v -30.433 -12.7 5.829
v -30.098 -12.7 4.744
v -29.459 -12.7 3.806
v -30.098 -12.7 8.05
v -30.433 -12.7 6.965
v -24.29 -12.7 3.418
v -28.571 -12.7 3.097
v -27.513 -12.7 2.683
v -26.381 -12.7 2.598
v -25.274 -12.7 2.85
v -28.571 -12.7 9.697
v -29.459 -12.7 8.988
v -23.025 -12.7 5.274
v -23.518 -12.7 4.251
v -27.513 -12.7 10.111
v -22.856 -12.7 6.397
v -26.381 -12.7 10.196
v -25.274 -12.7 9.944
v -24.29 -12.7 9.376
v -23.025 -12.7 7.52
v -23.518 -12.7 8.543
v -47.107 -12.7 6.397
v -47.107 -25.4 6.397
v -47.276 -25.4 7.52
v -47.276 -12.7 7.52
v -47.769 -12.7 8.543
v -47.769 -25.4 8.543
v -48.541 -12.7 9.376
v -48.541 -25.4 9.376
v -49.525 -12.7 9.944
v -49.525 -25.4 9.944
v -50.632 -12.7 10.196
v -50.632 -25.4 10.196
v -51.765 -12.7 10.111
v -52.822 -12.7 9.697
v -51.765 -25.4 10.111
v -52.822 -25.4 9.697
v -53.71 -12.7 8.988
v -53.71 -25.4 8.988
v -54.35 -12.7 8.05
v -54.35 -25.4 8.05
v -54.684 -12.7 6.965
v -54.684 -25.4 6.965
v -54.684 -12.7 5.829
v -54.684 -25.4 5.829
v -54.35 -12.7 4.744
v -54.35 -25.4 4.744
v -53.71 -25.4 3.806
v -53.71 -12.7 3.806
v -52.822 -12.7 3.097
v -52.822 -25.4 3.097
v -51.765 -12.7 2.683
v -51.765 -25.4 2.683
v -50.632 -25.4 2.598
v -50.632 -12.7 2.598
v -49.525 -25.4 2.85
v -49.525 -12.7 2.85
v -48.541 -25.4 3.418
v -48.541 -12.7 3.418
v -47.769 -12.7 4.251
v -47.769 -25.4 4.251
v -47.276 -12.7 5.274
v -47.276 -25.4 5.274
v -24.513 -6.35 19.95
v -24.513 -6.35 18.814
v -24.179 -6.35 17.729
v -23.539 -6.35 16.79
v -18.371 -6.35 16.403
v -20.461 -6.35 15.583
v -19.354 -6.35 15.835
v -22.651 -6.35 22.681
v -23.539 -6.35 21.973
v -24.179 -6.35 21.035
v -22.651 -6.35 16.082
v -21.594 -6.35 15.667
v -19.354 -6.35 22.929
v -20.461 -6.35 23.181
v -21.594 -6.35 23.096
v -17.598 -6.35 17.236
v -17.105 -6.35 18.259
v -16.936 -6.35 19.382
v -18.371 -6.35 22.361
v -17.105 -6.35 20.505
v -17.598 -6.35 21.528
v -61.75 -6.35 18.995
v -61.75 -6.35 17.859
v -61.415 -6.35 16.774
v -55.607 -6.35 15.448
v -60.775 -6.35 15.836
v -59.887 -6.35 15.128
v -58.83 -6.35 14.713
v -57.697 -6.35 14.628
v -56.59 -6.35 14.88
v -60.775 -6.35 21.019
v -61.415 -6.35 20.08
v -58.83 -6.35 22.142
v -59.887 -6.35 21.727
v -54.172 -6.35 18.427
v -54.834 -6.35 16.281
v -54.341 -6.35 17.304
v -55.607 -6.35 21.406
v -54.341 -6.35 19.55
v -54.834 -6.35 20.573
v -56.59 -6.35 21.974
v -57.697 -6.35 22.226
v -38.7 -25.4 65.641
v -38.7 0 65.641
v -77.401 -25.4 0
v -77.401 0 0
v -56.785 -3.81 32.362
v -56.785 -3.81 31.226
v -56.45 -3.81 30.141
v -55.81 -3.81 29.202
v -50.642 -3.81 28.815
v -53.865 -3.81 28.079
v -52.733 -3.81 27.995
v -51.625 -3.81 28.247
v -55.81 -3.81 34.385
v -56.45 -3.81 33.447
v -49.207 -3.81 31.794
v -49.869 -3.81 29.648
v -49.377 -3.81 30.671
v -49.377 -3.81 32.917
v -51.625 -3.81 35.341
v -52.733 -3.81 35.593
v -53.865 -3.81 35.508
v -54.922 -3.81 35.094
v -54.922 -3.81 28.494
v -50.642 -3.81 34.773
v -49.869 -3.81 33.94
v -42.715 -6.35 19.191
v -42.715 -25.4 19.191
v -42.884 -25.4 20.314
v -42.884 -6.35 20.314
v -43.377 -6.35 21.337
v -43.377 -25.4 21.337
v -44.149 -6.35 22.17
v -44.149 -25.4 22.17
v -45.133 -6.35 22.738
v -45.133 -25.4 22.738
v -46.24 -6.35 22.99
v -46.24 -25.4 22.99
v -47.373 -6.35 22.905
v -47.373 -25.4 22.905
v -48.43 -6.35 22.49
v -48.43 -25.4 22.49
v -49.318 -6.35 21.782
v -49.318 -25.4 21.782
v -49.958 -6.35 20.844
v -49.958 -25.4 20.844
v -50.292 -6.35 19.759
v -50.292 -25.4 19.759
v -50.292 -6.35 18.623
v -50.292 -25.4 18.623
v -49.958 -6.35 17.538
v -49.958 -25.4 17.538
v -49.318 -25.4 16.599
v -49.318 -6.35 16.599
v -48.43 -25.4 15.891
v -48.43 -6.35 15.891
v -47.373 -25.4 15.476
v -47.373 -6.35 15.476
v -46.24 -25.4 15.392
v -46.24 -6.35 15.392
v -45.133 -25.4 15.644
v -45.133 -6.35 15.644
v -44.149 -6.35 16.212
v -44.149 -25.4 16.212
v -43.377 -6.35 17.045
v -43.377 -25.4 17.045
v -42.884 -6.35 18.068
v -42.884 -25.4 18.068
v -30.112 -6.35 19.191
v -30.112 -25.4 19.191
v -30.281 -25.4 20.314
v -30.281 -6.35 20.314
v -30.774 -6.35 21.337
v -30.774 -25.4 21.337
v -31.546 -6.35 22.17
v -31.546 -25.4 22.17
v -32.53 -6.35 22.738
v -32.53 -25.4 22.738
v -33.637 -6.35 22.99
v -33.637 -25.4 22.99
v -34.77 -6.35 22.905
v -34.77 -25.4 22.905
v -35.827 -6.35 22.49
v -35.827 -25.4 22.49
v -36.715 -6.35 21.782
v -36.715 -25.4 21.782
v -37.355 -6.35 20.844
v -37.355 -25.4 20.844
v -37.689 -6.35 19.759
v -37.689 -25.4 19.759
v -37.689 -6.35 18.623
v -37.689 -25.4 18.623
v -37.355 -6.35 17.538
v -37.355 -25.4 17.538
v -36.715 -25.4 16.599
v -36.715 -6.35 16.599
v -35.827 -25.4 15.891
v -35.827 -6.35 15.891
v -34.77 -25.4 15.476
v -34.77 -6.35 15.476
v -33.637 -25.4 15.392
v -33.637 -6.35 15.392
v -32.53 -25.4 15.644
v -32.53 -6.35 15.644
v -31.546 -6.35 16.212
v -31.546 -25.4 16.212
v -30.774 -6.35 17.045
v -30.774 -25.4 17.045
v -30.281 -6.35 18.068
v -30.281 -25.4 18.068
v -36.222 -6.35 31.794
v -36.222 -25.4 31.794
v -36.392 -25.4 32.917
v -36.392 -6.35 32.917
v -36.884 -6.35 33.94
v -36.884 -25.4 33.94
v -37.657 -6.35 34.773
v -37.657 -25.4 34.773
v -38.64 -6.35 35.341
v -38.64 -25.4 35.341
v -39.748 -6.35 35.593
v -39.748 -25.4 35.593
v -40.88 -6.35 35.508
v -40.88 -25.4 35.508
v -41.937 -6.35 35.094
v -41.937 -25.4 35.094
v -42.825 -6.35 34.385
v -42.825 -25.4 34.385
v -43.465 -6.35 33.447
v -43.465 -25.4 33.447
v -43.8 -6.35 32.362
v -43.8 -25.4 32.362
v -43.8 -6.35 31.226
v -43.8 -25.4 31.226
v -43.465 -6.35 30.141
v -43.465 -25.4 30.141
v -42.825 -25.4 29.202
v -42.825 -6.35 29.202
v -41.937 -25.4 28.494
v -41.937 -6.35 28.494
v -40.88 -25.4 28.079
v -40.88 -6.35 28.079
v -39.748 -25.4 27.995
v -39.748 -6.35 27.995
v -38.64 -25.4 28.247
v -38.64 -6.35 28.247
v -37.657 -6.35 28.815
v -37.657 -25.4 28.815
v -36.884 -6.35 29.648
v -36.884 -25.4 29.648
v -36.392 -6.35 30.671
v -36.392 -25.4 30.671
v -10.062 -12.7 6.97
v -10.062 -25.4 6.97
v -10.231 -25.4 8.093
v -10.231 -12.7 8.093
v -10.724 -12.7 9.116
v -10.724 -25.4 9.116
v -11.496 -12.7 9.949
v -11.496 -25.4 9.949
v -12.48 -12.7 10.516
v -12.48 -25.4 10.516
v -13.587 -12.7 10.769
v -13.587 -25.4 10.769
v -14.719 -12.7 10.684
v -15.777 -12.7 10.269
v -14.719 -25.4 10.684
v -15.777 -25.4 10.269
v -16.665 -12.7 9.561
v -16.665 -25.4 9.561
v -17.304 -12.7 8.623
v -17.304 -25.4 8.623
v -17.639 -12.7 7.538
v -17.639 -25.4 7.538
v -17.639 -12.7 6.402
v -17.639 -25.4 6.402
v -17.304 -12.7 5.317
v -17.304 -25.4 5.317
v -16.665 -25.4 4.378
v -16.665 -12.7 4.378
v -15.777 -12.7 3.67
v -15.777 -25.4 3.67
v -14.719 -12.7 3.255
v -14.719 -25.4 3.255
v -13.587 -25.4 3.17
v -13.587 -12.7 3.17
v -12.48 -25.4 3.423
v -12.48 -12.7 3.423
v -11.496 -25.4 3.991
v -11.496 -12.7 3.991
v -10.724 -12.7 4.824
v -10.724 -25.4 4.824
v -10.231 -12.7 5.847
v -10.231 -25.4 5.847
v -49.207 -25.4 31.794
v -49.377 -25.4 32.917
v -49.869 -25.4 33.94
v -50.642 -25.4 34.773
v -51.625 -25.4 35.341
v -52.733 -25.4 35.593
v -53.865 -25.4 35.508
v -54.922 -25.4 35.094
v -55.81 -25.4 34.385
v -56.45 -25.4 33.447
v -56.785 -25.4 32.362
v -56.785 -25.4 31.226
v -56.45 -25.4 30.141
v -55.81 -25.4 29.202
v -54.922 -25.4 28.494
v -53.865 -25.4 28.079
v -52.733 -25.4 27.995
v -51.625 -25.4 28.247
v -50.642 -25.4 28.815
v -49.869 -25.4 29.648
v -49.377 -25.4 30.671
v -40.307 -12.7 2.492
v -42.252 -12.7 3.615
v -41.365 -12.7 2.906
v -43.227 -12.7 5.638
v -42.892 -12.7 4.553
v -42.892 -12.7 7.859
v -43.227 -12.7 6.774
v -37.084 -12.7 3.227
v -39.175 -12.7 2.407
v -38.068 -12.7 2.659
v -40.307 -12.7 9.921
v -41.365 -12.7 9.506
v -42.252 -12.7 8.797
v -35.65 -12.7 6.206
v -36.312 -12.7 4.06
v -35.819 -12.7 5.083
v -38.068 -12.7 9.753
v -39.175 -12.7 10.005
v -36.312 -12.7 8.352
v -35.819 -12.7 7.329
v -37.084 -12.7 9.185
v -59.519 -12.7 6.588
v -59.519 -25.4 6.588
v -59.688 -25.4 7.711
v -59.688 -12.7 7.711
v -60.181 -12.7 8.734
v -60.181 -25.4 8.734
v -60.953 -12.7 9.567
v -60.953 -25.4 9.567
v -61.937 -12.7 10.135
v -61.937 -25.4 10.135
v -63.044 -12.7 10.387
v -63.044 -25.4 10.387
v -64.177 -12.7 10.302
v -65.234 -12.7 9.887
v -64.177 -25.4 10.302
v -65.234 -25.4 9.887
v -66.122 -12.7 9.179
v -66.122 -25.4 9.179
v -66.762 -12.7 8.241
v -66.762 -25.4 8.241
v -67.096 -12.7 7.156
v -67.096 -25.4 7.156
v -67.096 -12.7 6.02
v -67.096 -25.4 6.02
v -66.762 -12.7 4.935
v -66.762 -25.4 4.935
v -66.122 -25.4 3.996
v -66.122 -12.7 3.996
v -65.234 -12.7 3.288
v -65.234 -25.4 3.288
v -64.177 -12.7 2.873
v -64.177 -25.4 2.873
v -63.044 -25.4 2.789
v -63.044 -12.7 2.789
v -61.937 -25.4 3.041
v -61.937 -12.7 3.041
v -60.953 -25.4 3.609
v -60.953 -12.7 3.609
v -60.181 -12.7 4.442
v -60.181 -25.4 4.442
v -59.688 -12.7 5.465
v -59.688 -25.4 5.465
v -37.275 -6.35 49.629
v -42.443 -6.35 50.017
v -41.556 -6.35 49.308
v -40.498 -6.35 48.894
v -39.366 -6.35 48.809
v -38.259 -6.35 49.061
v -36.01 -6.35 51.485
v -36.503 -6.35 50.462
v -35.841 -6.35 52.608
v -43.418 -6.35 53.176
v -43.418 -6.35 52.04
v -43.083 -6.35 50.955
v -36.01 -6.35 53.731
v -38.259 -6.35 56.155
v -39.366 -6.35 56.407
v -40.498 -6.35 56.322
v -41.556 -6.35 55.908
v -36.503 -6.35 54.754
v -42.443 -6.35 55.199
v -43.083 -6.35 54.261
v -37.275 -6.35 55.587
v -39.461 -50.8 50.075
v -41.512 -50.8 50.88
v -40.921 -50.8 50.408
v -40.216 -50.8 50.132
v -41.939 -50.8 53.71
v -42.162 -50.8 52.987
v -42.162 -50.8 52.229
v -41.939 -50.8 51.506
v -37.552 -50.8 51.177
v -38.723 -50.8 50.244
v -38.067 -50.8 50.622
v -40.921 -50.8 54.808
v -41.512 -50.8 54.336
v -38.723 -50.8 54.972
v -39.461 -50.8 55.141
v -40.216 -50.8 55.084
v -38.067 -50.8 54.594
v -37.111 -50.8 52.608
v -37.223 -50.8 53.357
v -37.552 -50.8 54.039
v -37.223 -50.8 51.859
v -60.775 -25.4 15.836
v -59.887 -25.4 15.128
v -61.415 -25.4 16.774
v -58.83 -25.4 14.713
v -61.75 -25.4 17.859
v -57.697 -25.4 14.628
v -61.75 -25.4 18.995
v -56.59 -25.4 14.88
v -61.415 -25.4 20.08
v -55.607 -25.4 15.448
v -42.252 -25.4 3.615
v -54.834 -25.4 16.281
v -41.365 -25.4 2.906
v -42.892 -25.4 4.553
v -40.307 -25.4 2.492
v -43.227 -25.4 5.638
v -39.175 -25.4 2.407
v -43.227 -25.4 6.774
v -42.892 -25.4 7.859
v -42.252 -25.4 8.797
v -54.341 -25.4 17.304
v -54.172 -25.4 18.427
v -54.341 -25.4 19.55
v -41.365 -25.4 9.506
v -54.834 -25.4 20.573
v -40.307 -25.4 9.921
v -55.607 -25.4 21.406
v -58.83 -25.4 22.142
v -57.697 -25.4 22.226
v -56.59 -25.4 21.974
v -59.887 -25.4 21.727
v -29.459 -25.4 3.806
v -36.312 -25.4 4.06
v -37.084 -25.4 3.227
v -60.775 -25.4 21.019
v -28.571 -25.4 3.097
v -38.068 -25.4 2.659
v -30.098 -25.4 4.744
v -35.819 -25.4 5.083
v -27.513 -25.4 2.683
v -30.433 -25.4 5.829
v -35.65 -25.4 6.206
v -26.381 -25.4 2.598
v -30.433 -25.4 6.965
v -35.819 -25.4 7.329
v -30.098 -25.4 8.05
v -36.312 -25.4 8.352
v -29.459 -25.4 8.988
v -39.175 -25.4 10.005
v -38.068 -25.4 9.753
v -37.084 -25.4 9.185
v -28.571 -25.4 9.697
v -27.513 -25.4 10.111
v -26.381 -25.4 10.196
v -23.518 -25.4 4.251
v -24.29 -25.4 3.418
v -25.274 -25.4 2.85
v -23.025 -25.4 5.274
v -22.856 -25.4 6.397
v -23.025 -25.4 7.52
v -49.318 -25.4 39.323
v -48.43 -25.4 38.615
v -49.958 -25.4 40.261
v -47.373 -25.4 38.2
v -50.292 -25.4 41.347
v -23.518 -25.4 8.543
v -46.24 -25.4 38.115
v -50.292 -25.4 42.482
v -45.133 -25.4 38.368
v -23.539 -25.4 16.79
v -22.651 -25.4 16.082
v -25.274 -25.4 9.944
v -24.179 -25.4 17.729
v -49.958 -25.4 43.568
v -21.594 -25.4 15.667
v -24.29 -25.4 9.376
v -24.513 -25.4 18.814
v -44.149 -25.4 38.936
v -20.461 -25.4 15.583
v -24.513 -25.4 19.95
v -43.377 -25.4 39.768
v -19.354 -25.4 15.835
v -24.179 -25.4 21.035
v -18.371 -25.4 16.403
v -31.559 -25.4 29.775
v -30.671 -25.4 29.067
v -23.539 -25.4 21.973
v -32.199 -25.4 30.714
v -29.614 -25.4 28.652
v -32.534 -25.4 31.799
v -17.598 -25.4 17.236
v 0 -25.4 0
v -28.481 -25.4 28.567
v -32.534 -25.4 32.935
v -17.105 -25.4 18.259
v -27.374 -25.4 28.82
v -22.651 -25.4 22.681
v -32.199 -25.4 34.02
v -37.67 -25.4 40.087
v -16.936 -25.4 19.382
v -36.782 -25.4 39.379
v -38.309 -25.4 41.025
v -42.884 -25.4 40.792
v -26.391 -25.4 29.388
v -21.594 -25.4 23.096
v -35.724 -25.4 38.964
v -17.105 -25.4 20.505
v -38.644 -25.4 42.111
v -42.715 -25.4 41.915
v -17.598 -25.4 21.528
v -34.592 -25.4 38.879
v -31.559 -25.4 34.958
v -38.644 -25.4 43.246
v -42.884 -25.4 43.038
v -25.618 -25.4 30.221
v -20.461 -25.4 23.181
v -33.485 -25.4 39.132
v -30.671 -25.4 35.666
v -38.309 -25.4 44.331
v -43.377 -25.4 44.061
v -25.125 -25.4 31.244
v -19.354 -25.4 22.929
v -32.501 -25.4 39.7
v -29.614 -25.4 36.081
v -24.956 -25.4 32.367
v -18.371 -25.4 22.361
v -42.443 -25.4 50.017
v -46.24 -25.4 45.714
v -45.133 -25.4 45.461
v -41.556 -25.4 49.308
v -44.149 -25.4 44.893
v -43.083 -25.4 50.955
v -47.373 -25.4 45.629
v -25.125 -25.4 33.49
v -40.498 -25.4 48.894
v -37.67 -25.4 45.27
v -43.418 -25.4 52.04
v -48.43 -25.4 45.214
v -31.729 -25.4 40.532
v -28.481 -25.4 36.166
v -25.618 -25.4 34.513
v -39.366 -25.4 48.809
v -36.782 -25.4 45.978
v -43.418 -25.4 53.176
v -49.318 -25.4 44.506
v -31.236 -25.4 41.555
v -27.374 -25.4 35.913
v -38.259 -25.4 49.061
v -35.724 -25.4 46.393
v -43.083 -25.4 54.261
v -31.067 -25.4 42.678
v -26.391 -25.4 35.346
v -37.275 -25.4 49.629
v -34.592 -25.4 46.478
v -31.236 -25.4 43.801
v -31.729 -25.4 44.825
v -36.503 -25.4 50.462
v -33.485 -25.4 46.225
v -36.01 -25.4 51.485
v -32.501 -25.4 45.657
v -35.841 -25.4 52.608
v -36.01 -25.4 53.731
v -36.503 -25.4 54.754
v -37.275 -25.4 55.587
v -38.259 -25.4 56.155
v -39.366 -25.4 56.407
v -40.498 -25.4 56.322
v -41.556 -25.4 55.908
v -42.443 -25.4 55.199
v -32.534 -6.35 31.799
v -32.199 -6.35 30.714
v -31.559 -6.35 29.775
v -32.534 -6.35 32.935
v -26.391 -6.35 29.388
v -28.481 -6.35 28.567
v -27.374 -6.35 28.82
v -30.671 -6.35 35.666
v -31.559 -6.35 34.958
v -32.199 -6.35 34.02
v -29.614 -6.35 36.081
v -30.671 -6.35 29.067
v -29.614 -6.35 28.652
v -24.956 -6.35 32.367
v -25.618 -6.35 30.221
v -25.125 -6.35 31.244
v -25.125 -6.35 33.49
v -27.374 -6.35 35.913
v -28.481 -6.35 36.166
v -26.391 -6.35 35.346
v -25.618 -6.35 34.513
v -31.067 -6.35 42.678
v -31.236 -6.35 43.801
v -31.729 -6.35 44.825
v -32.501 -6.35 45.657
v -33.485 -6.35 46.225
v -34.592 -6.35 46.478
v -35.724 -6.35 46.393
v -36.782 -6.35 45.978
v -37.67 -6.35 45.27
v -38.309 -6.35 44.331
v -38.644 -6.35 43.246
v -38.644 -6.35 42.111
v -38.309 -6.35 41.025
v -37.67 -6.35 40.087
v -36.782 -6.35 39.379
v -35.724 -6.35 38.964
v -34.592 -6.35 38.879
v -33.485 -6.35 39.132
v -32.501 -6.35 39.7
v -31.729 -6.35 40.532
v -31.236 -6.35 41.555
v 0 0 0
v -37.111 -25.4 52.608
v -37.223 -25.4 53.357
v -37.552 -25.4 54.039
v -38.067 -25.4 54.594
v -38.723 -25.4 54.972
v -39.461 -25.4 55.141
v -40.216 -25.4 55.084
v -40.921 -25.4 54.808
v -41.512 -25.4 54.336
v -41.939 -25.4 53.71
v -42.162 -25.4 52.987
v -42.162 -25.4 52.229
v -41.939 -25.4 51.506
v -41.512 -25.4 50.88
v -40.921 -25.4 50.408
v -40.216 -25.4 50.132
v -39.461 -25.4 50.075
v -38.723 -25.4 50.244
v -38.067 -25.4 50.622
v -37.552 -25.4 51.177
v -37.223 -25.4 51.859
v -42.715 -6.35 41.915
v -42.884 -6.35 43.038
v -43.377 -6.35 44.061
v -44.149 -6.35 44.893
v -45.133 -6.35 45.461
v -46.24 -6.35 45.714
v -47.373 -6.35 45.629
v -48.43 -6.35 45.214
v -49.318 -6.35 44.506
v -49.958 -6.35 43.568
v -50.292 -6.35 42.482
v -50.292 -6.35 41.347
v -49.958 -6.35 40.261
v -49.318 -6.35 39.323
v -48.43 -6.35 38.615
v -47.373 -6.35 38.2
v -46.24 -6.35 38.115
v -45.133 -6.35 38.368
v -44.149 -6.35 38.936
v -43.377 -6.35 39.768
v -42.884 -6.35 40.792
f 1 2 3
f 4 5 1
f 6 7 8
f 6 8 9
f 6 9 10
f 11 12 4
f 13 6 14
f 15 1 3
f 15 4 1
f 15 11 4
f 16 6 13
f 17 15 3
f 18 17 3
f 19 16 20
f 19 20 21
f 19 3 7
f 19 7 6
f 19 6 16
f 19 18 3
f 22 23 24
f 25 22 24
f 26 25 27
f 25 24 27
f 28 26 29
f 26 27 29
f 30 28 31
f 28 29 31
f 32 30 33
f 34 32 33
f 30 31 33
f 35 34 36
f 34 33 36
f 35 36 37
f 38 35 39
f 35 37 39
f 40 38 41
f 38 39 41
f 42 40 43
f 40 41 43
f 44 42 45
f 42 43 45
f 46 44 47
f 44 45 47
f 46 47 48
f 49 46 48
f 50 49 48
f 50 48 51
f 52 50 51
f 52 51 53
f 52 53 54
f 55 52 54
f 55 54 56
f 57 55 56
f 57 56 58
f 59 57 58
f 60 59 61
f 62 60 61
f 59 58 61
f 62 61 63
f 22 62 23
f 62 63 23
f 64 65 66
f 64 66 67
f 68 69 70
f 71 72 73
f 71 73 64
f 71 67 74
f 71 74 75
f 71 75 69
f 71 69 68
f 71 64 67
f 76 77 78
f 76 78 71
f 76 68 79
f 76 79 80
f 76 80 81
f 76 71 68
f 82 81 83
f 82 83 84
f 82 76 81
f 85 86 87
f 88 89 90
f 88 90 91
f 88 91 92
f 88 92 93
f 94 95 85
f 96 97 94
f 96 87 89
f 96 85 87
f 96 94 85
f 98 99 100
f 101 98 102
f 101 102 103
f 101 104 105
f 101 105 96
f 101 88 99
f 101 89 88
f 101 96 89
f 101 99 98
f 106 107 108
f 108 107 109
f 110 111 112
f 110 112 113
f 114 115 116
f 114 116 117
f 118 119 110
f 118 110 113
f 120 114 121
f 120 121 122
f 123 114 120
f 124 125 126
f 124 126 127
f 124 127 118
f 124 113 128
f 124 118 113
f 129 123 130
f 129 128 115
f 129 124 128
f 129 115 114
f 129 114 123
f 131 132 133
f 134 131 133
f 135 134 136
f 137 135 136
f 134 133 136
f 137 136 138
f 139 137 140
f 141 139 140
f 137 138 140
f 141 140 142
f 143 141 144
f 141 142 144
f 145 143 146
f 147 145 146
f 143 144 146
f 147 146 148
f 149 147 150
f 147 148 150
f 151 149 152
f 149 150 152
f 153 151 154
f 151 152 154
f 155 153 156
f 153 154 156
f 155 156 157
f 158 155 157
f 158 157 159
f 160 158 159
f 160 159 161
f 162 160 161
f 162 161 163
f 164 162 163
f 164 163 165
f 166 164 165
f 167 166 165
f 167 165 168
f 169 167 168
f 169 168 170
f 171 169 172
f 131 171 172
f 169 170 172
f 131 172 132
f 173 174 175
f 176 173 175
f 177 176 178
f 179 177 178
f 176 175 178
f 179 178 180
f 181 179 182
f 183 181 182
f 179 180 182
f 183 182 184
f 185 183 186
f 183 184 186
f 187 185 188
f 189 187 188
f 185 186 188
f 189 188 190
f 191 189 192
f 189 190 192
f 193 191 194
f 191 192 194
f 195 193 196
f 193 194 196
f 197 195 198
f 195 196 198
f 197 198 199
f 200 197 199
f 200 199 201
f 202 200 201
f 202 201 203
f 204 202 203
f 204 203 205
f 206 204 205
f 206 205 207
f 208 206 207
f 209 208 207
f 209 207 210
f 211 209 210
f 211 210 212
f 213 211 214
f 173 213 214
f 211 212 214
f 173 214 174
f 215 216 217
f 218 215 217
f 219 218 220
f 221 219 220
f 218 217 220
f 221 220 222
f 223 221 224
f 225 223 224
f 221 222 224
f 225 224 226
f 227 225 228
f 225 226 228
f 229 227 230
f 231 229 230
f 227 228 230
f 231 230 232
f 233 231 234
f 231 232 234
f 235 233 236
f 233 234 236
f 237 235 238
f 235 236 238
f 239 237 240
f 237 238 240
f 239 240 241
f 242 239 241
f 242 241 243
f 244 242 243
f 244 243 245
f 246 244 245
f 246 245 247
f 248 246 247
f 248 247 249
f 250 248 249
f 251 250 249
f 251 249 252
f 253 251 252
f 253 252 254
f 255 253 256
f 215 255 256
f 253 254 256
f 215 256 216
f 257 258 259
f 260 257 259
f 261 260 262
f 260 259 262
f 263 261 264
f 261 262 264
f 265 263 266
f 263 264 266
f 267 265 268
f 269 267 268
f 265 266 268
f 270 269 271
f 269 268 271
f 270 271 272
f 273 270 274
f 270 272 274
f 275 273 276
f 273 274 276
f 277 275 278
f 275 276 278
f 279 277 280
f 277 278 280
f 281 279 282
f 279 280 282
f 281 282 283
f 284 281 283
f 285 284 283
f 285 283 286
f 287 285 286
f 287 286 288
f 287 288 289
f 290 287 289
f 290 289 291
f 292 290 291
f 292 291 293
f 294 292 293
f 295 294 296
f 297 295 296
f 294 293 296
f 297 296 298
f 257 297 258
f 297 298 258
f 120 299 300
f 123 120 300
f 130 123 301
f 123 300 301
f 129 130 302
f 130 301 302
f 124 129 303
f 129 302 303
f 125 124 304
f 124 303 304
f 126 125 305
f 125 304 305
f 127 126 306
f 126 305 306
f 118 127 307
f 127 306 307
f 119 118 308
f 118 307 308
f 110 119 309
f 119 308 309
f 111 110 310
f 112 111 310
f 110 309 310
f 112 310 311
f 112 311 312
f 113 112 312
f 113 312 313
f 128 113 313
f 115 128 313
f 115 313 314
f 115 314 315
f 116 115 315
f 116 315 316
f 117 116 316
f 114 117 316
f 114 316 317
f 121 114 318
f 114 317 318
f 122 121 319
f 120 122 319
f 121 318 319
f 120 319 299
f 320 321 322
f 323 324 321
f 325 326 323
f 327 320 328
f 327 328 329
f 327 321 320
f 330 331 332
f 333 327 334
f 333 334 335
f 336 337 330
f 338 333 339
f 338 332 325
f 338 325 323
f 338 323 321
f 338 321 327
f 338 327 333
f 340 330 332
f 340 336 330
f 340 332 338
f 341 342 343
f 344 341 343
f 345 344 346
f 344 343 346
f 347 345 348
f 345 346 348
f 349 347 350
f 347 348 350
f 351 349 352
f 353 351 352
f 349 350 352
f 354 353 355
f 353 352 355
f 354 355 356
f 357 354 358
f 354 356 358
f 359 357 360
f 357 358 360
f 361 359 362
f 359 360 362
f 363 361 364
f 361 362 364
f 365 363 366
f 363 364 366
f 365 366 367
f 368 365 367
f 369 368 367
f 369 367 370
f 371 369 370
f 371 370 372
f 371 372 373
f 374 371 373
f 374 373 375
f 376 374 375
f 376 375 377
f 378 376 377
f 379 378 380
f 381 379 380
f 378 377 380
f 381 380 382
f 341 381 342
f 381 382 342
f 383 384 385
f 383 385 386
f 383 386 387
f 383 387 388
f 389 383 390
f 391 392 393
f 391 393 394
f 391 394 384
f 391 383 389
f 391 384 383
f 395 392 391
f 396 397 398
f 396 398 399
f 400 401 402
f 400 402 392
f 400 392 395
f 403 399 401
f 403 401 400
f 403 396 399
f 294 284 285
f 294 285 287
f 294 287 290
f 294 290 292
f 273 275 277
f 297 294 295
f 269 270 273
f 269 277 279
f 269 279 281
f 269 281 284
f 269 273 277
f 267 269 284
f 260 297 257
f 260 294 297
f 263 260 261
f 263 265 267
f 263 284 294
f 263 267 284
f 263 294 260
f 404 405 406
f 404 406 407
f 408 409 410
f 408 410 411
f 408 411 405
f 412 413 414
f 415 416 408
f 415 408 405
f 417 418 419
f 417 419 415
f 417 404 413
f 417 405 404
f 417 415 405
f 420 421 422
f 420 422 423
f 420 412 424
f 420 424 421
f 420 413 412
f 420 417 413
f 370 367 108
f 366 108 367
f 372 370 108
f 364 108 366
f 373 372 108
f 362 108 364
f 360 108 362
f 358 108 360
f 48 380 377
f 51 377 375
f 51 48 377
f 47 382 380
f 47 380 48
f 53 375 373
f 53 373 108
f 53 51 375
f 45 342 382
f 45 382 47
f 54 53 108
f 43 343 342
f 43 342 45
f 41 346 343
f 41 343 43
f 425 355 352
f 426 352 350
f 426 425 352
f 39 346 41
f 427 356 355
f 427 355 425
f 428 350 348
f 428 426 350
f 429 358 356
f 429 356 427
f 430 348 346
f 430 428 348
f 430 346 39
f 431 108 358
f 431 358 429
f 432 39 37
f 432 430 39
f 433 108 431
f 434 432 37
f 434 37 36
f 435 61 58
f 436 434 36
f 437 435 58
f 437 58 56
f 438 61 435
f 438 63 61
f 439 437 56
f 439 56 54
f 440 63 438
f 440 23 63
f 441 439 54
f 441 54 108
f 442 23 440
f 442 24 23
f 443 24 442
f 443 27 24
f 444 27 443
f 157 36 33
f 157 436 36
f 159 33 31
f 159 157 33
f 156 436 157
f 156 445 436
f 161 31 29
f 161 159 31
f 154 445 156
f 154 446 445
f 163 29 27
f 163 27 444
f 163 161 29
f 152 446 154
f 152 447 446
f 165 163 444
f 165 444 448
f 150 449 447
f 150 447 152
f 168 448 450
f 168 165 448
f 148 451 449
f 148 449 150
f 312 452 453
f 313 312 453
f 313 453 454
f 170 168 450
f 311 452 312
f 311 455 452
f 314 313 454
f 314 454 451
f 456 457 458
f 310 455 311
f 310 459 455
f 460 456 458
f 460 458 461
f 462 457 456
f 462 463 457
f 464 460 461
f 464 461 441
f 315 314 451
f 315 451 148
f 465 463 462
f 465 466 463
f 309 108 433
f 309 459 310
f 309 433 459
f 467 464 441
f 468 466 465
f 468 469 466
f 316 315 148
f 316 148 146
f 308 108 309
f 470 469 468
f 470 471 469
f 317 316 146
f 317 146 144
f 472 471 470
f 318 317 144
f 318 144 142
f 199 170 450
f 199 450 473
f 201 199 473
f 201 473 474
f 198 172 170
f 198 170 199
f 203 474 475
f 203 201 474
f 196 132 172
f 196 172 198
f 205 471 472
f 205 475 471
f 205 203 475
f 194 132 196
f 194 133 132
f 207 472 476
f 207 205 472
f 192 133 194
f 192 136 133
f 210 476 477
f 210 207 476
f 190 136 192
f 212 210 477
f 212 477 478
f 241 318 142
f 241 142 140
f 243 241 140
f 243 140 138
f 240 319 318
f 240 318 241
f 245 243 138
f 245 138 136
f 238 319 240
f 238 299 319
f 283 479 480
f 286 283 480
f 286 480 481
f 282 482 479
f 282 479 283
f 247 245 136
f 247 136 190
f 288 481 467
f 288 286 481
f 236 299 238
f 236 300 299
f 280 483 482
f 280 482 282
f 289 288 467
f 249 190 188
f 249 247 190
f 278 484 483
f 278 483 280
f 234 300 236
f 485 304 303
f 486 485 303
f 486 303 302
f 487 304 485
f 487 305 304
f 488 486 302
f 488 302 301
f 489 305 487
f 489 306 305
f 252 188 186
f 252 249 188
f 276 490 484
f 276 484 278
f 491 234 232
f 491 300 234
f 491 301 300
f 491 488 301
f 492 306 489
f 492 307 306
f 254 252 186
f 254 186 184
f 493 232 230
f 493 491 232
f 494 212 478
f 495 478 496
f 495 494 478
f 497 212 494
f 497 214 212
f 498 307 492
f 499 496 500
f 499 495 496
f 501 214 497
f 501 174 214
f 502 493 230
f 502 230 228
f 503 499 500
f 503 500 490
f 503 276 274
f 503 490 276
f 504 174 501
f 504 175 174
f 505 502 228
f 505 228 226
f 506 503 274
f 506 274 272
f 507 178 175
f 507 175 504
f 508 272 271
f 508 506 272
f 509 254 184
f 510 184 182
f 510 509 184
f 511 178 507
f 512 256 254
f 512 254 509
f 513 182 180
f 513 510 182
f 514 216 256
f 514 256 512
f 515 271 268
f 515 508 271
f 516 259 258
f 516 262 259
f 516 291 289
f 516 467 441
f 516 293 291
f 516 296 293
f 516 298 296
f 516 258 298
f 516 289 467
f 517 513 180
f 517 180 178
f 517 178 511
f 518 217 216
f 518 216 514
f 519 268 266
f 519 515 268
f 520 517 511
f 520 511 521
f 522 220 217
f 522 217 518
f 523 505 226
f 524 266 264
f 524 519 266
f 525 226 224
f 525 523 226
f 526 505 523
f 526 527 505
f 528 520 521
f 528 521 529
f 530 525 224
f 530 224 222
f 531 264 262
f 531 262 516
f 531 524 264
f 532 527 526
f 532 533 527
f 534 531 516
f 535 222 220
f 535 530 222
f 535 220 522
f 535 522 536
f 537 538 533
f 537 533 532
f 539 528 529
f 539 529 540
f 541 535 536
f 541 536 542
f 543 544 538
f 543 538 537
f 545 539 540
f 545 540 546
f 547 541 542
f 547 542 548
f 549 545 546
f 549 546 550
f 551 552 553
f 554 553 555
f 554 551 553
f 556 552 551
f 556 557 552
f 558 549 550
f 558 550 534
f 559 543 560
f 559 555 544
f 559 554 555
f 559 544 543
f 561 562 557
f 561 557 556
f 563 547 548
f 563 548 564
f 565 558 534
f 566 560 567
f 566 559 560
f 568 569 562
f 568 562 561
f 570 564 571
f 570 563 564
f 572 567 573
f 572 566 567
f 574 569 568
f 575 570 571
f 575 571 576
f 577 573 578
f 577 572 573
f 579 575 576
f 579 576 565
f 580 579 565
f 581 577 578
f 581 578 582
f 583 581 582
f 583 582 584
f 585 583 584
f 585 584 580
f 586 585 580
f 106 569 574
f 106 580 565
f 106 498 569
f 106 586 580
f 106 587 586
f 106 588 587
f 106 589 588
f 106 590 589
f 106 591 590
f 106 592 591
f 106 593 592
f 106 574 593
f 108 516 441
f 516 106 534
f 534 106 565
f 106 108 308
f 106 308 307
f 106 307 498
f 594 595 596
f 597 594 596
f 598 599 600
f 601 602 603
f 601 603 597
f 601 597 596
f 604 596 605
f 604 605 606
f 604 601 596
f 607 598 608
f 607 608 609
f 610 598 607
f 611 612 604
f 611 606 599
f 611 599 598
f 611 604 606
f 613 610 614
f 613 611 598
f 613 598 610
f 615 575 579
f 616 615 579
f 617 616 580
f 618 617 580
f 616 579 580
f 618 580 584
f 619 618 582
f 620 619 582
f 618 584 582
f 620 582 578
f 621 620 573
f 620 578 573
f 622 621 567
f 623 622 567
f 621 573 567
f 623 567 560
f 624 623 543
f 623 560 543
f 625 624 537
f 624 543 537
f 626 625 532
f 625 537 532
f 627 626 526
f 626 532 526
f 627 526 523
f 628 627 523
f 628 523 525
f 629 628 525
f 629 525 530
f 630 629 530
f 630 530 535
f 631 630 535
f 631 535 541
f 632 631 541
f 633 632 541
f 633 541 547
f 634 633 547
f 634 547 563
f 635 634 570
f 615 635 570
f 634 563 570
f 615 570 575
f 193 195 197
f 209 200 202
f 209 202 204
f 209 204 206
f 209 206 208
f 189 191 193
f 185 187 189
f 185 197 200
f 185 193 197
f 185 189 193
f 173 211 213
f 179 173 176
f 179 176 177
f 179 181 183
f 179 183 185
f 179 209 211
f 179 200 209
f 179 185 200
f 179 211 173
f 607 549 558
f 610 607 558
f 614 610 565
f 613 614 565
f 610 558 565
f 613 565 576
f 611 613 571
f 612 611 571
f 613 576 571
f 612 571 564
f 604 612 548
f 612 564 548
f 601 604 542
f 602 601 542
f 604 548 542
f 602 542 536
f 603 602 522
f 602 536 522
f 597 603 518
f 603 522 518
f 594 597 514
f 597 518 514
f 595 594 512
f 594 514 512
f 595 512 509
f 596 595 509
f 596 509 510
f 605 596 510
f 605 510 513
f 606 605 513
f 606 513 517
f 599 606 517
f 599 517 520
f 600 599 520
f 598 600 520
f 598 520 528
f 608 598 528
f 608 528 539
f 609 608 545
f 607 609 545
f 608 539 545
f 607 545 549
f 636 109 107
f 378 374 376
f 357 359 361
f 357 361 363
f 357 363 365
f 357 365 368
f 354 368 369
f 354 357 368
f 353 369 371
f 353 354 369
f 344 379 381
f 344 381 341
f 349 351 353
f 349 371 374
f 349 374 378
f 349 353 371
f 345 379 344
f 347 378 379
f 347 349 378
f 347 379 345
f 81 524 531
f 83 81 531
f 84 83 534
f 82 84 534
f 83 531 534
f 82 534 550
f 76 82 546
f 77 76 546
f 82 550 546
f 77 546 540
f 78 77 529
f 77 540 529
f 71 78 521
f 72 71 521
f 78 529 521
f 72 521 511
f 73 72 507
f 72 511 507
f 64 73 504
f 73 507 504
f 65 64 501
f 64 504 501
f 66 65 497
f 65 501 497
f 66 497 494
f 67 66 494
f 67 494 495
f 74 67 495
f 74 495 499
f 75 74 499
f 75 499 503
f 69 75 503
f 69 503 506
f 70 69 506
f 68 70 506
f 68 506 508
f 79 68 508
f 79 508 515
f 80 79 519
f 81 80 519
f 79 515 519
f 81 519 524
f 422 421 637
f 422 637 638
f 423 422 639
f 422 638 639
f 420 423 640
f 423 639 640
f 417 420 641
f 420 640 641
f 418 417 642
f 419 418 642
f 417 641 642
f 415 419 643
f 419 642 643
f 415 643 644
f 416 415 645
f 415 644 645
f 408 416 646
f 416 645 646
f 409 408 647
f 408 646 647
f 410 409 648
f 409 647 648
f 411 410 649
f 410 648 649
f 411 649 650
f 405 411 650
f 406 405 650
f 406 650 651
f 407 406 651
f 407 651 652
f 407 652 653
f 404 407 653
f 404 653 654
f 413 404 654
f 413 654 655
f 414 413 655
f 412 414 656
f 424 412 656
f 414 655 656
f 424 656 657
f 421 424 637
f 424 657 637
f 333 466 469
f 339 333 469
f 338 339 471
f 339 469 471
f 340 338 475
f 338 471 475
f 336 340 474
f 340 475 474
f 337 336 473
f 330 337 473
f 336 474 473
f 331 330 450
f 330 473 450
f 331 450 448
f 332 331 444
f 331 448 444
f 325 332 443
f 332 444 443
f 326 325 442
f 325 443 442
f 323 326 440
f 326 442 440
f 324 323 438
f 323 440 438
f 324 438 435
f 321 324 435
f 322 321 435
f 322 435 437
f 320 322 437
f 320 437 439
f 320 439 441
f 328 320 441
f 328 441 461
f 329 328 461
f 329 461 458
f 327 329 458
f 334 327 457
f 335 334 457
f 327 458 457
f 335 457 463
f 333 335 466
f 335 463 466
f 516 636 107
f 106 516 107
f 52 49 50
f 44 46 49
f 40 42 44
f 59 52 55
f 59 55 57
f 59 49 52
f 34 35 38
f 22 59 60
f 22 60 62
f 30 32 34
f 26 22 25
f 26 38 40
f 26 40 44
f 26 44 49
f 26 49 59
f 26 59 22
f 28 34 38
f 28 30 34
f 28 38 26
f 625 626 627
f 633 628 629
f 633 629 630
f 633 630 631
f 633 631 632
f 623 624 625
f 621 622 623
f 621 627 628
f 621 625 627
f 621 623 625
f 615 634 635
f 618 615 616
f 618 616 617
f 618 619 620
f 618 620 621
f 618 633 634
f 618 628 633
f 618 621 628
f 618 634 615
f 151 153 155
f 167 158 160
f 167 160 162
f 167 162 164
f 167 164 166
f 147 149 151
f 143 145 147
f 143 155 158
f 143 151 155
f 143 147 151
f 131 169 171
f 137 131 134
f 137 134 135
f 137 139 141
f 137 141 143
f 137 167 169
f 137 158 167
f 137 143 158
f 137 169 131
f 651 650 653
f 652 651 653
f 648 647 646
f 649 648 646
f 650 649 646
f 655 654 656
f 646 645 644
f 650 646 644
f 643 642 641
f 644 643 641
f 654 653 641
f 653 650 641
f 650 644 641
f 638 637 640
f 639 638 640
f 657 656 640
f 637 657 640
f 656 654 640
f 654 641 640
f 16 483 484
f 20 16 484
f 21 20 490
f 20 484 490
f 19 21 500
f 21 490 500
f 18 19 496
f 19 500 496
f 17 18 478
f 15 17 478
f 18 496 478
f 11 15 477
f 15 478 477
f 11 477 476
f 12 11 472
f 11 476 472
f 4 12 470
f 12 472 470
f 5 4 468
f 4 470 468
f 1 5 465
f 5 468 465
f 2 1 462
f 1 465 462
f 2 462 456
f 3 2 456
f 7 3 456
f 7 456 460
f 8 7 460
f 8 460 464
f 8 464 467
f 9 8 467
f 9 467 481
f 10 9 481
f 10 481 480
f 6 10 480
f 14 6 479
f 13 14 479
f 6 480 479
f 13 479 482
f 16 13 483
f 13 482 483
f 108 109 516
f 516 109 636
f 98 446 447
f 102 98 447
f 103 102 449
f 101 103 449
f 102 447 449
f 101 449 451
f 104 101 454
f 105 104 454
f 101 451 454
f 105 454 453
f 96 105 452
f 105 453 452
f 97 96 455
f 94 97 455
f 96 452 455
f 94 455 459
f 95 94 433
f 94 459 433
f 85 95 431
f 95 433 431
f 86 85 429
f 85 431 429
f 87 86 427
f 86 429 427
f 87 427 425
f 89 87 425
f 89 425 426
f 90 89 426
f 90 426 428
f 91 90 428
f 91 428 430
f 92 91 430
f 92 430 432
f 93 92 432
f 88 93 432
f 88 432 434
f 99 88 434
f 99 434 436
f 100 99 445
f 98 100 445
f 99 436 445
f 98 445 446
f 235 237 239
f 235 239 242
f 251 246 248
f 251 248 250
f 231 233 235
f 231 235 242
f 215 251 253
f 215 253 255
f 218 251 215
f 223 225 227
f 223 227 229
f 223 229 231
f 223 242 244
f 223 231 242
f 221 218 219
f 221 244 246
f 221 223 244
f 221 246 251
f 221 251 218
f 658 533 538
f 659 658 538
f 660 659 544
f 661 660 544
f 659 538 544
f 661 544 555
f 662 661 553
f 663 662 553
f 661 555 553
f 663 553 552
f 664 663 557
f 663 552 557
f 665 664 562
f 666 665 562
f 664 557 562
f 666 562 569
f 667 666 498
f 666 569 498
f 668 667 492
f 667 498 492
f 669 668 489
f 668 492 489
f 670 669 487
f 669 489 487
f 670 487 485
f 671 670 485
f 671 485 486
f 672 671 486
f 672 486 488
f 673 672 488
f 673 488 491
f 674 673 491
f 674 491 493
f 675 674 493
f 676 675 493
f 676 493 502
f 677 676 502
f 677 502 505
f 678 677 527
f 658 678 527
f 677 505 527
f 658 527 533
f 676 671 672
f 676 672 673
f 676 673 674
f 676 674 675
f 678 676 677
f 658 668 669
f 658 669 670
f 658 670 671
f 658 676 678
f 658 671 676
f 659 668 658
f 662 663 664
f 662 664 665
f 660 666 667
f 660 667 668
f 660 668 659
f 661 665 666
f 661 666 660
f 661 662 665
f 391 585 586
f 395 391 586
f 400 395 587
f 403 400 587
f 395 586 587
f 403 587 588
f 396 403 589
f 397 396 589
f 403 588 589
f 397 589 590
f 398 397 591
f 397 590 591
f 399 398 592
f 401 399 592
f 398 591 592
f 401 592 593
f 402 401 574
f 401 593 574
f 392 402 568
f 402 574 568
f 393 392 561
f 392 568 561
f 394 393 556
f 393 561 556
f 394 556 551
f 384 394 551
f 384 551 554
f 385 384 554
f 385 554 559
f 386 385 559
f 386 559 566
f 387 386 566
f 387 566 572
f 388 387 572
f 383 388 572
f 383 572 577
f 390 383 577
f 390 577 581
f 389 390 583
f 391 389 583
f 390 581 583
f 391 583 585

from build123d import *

# Parameters (mm, degrees)
F1_DEPTH  = 25.4
F2_R      = 3.81
F3_DEPTH  = 12.7
F4_R      = 3.81
F14_DEPTH = 25.4
F5_R      = 3.81
F16_DEPTH = 19.05
F6_R      = 3.81
F17_DEPTH = 19.05
F8_R      = 3.81
F18_DEPTH = 19.05
F7_R      = 3.81
F19_DEPTH = 19.05
F12_R     = 3.81
F20_DEPTH = 19.05
F13_R     = 3.81
F21_DEPTH = 19.05
F11_R     = 3.81
F22_DEPTH = 19.05
F9_R      = 3.81
F23_DEPTH = 21.59
F15_R     = 3.81
F24_DEPTH = 19.05
F10_R     = 3.81
F25_DEPTH = 19.05
F26_R     = 2.54
F27_DEPTH = 25.4


with BuildPart() as f1:
    # F0 (on Front) → F1 (new body)
    with BuildSketch(Plane.XZ):
        Polygon((-77.400591, 0), (0, 0), (-38.700295, 65.640895), align=None)
    extrude(amount=F1_DEPTH)

    # F2 (on face) → F3 (cut)
    with BuildSketch(Plane.XZ.offset(25.4)):
        with Locations((-63.328899, 6.587936)):
            Circle(F2_R)
        with Locations((-50.916847, 6.396981)):
            Circle(F2_R)
        with Locations((-39.459564, 6.206026)):
            Circle(F2_R)
        with Locations((-26.665604, 6.396981)):
            Circle(F2_R)
        with Locations((-13.871642, 6.969845)):
            Circle(F2_R)
    extrude(amount=-F3_DEPTH, mode=Mode.SUBTRACT)

    # F4 (on face) → F14 (cut)
    with BuildSketch(Plane.XZ.offset(25.4)):
        with Locations((-57.60026, 18.999988)):
            Circle(F4_R)
    extrude(amount=F14_DEPTH, mode=Mode.SUBTRACT)

    # F5 (on face) → F16 (cut)
    with BuildSketch(Plane.XZ.offset(25.4)):
        with Locations((-46.524886, 19.190943)):
            Circle(F5_R)
    extrude(amount=-F16_DEPTH, mode=Mode.SUBTRACT)

    # F6 (on face) → F17 (cut)
    with BuildSketch(Plane.XZ.offset(25.4)):
        with Locations((-33.921879, 19.190943)):
            Circle(F6_R)
    extrude(amount=-F17_DEPTH, mode=Mode.SUBTRACT)

    # F8 (on face) → F18 (cut)
    with BuildSketch(Plane.XZ.offset(25.4)):
        with Locations((-40.032428, 31.793948)):
            Circle(F8_R)
    extrude(amount=-F18_DEPTH, mode=Mode.SUBTRACT)

    # F7 (on face) → F19 (cut)
    with BuildSketch(Plane.XZ.offset(25.4)):
        with Locations((-20.746009, 19.381898)):
            Circle(F7_R)
    extrude(amount=-F19_DEPTH, mode=Mode.SUBTRACT)

    # F12 (on face) → F20 (cut)
    with BuildSketch(Plane.XZ.offset(25.4)):
        with Locations((-34.876652, 42.678364)):
            Circle(F12_R)
    extrude(amount=-F20_DEPTH, mode=Mode.SUBTRACT)

    # F13 (on face) → F21 (cut)
    with BuildSketch(Plane.XZ.offset(25.4)):
        with Locations((-39.650518, 52.608009)):
            Circle(F13_R)
    extrude(amount=-F21_DEPTH, mode=Mode.SUBTRACT)

    # F11 (on face) → F22 (cut)
    with BuildSketch(Plane.XZ.offset(25.4)):
        with Locations((-46.524886, 41.914549)):
            Circle(F11_R)
    extrude(amount=-F22_DEPTH, mode=Mode.SUBTRACT)

    # F9 (on face) → F23 (cut)
    with BuildSketch(Plane.XZ.offset(25.4)):
        with Locations((-53.017348, 31.793948)):
            Circle(F9_R)
    extrude(amount=-F23_DEPTH, mode=Mode.SUBTRACT)

    # F15 (on face) → F24 (cut)
    with BuildSketch(Plane.XZ.offset(25.4)):
        with Locations((-57.982165, 18.427124)):
            Circle(F15_R)
    extrude(amount=-F24_DEPTH, mode=Mode.SUBTRACT)

    # F10 (on face) → F25 (cut)
    with BuildSketch(Plane.XZ.offset(25.4)):
        with Locations((-28.766105, 32.366816)):
            Circle(F10_R)
    extrude(amount=-F25_DEPTH, mode=Mode.SUBTRACT)


with BuildPart() as f27:
    # F26 (on face) → F27 (new body)
    with BuildSketch(Plane.XZ.offset(25.4)):
        with Locations((-39.650518, 52.608009)):
            Circle(F26_R)
    extrude(amount=F27_DEPTH)


solid = Compound([f1.part, f27.part])
